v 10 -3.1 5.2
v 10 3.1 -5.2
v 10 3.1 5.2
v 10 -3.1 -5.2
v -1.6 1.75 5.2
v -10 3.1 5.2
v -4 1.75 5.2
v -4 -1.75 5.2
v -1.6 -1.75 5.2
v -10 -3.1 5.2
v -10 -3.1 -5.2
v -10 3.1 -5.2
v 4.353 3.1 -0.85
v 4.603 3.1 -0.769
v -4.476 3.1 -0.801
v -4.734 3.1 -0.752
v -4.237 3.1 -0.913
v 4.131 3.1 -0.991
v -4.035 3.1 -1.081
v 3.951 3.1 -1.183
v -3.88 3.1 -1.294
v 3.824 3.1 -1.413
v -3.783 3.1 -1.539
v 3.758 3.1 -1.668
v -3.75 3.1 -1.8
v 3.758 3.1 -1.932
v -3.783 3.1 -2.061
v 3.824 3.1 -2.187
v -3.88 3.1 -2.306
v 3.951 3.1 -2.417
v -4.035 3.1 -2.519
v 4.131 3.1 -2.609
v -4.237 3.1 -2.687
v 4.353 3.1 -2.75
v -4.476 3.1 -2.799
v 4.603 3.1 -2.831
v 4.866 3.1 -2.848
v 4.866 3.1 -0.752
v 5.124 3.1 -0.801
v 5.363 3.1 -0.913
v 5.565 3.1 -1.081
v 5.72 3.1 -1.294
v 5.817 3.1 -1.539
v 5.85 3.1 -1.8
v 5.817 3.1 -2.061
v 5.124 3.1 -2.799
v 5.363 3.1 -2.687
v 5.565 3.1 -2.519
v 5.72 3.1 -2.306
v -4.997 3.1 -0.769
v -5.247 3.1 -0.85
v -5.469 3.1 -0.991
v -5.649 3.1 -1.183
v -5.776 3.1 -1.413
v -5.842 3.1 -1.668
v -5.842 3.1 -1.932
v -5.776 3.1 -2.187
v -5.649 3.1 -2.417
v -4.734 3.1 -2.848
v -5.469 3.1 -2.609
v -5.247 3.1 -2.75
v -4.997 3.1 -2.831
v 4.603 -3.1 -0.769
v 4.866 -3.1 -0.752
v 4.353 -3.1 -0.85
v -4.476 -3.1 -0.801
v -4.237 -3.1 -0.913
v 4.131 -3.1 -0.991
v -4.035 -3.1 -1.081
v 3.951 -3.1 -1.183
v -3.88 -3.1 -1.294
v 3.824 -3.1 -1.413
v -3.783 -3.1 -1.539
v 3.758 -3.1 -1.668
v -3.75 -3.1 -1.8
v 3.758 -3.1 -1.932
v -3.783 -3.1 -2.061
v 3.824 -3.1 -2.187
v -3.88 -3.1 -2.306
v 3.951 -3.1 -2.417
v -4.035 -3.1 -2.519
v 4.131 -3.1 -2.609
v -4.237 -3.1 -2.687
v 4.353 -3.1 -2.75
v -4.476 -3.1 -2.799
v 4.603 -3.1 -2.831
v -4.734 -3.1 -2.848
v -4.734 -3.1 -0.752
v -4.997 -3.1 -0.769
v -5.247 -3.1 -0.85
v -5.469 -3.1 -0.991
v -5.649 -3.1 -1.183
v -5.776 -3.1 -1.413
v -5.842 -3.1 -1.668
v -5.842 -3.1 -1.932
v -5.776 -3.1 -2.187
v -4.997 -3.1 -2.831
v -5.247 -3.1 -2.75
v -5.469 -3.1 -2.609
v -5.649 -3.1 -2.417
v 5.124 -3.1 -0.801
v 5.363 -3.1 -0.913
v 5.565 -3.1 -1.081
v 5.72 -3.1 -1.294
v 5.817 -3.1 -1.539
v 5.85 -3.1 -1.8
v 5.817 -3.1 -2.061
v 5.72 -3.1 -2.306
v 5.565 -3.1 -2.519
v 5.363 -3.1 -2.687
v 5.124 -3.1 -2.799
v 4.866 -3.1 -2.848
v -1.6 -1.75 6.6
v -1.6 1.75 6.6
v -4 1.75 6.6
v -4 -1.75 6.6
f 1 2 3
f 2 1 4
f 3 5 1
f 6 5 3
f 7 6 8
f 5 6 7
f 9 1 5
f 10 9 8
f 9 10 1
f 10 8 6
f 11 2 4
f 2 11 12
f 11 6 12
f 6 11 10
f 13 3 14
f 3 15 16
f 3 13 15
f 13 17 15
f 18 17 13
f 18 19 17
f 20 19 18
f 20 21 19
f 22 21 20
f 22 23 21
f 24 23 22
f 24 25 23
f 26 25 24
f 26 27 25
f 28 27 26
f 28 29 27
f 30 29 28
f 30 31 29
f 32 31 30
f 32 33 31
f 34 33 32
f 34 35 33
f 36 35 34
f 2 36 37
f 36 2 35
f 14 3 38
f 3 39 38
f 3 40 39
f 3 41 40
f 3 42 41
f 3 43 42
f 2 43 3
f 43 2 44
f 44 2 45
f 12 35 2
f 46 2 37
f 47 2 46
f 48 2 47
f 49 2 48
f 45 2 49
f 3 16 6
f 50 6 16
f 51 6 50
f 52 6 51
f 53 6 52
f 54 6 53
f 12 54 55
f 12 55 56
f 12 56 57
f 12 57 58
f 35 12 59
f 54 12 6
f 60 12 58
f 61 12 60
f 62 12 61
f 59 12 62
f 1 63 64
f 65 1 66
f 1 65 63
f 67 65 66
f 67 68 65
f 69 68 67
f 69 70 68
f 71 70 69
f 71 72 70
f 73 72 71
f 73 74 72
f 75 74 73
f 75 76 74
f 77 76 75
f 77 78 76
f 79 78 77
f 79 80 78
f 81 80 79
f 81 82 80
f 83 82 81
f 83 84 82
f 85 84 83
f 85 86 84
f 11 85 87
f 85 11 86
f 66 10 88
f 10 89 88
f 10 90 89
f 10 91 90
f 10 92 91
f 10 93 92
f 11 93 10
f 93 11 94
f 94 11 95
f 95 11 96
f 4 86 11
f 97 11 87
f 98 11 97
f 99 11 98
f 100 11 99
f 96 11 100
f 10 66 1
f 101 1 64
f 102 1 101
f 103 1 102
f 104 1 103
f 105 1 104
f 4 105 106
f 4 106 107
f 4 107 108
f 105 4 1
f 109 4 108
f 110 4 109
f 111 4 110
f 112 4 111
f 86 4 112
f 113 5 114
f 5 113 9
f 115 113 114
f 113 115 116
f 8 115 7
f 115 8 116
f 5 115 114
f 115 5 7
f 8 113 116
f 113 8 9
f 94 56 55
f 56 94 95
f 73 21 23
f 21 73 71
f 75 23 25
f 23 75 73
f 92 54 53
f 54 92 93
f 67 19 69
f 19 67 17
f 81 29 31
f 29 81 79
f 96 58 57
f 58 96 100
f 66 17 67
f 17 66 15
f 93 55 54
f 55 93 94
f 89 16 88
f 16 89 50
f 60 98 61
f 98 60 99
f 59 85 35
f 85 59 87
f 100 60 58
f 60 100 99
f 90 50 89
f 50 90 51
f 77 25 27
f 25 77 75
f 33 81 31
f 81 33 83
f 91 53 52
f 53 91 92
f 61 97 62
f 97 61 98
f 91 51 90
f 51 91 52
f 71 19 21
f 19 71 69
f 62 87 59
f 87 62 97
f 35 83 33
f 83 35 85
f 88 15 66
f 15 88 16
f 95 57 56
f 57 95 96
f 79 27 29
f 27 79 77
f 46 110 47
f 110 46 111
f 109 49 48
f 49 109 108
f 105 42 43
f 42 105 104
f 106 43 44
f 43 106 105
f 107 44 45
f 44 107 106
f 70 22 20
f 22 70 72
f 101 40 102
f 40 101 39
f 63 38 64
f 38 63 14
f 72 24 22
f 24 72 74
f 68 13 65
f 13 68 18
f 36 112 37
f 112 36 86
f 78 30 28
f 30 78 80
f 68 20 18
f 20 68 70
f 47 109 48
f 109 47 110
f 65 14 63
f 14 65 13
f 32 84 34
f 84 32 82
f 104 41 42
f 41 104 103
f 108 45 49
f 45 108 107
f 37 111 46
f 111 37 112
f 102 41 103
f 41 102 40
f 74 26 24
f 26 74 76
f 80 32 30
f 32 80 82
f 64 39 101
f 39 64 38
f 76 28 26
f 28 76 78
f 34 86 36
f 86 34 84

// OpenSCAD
$fn = 25;

module endstop_switch()
{
    difference()
    {
        union()
        {
            // Switch body
            cube([20, 6.2, 10.4], center=true);
            // Switch button
            translate([20/2-2.4/2-11.6,0,10.4/2+1.4/2])
                cube([2.4, 3.5, 1.4], center=true);
        }
        // Mount holes
        for(i=[-1,1])
        translate([9.6/2*i,0,10.4/2-7])
        rotate([90,0,0])
        cylinder(r=2.1/2, h=7, center=true);

    }
}

endstop_switch();
